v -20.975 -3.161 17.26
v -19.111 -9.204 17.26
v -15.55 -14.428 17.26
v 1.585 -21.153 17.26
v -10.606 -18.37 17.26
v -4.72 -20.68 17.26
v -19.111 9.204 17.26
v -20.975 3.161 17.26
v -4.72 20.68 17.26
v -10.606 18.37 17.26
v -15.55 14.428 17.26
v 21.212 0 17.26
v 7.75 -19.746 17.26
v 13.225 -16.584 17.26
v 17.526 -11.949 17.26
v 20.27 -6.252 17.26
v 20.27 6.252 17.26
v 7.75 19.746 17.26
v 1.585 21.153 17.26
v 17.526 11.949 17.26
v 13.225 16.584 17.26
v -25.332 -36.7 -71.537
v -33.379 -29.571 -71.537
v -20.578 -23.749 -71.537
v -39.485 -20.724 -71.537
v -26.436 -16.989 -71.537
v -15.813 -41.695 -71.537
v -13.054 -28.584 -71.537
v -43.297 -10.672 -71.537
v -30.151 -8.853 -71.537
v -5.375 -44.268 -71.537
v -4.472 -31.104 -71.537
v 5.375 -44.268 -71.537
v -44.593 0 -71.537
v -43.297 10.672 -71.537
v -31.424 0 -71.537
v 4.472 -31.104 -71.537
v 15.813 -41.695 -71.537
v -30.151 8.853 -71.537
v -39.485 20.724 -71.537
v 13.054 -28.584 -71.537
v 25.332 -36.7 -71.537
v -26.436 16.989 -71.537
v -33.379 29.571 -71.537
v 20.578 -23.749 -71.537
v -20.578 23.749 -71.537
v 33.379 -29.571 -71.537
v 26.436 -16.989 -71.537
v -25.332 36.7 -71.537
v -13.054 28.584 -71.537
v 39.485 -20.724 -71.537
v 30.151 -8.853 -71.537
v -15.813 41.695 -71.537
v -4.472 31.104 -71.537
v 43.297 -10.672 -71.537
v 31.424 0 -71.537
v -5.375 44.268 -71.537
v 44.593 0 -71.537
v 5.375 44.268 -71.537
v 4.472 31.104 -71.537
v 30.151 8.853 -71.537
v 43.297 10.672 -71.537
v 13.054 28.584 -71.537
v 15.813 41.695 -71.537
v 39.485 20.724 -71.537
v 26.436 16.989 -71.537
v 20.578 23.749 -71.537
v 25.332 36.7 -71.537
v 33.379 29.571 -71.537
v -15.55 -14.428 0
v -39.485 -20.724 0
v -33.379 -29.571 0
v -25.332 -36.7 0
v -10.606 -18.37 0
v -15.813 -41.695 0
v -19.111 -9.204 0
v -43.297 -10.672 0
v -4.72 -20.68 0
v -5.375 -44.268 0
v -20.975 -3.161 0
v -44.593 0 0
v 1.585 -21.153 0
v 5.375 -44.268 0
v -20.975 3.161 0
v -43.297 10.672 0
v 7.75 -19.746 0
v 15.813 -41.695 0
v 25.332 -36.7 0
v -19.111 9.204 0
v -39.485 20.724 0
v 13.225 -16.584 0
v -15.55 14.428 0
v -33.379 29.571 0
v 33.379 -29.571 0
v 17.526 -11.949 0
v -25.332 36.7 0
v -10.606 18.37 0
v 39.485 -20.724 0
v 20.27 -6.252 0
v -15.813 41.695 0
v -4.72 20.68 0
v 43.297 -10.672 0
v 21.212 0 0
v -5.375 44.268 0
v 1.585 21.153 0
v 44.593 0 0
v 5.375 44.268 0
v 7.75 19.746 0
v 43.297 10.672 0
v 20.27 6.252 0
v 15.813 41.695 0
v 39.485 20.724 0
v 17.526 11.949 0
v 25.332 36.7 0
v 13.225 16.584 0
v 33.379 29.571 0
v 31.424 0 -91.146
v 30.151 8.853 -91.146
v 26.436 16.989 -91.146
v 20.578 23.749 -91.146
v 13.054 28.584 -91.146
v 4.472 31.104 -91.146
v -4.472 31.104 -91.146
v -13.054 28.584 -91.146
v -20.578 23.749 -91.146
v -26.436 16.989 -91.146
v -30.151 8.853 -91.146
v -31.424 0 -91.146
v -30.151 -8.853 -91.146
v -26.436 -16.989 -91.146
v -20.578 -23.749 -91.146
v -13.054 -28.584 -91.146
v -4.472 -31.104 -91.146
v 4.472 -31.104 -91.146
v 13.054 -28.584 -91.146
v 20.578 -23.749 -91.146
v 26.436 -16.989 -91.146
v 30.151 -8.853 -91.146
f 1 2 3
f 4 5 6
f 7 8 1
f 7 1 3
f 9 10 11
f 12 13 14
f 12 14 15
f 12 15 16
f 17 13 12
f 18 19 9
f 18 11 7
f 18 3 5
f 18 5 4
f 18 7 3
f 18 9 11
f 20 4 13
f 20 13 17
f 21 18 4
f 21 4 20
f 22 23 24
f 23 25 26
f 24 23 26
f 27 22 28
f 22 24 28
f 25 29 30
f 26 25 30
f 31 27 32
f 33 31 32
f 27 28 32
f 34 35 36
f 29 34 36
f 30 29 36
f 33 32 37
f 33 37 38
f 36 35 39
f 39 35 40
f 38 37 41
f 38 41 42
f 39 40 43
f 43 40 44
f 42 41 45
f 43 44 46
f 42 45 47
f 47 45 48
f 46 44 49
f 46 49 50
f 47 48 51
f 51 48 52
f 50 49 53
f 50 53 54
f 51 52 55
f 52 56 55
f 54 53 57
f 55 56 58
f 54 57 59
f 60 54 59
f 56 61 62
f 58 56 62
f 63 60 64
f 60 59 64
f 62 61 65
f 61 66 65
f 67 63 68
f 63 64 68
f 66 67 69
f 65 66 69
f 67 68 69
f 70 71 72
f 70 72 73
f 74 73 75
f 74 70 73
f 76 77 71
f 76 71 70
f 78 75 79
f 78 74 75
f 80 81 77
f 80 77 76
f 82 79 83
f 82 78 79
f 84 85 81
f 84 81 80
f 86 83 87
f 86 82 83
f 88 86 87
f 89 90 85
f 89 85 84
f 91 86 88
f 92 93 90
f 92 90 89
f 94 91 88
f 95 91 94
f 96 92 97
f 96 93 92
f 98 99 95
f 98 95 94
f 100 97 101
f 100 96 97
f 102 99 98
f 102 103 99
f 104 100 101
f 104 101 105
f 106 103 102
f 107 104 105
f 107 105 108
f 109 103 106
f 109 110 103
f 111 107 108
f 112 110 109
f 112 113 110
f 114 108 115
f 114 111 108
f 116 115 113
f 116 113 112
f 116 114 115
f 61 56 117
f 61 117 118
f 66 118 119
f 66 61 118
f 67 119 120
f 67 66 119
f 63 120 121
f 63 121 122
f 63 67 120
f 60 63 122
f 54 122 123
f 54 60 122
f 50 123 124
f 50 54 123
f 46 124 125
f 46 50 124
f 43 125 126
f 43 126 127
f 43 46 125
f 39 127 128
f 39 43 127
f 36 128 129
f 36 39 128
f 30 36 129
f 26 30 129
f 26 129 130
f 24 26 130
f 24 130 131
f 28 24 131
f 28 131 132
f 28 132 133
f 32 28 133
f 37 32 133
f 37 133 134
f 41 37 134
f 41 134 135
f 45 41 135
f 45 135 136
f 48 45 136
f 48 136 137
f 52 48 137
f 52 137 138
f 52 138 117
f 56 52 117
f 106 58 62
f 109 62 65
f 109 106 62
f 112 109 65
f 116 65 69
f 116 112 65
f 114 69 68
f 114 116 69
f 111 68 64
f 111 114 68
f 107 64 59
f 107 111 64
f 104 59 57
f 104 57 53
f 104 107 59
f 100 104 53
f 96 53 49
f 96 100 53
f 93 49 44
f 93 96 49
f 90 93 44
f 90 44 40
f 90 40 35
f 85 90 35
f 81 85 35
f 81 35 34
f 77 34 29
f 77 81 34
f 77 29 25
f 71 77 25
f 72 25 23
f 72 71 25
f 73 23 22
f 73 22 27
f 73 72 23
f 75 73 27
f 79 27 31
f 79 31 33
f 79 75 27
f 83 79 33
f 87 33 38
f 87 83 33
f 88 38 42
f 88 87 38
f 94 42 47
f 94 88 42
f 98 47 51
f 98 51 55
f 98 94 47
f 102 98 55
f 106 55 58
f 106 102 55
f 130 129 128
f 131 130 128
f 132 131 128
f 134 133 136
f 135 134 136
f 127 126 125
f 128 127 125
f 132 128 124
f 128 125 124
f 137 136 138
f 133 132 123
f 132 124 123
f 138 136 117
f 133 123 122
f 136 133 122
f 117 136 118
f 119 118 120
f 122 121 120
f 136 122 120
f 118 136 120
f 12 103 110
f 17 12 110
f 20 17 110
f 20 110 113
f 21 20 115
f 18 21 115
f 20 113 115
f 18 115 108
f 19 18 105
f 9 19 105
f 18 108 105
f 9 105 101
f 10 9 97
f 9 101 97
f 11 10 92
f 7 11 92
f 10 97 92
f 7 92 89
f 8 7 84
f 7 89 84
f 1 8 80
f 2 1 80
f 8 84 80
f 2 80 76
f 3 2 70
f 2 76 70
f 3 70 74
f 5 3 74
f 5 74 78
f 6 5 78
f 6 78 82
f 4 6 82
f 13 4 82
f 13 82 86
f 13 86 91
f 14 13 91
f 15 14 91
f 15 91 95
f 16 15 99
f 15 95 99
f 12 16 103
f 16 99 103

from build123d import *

# Parameters (mm, degrees)
F0_R     = 21.212029
F1_DEPTH = 17.26026
F2_R     = 44.593298
F3_DEPTH = 71.53698
F4_R     = 31.424111
F5_DEPTH = 91.14636


with BuildPart() as f1:
    # F0 (on Top) → F1 (new body)
    with BuildSketch(Plane.XY):
        Circle(F0_R)
    extrude(amount=F1_DEPTH)

    # F2 (on Top) → F3 (join)
    with BuildSketch(Plane.XY):
        Circle(F2_R)
    extrude(amount=-F3_DEPTH)

    # F4 (on Top) → F5 (join)
    with BuildSketch(Plane.XY):
        Circle(F4_R)
    extrude(amount=-F5_DEPTH)


solid = f1.part
